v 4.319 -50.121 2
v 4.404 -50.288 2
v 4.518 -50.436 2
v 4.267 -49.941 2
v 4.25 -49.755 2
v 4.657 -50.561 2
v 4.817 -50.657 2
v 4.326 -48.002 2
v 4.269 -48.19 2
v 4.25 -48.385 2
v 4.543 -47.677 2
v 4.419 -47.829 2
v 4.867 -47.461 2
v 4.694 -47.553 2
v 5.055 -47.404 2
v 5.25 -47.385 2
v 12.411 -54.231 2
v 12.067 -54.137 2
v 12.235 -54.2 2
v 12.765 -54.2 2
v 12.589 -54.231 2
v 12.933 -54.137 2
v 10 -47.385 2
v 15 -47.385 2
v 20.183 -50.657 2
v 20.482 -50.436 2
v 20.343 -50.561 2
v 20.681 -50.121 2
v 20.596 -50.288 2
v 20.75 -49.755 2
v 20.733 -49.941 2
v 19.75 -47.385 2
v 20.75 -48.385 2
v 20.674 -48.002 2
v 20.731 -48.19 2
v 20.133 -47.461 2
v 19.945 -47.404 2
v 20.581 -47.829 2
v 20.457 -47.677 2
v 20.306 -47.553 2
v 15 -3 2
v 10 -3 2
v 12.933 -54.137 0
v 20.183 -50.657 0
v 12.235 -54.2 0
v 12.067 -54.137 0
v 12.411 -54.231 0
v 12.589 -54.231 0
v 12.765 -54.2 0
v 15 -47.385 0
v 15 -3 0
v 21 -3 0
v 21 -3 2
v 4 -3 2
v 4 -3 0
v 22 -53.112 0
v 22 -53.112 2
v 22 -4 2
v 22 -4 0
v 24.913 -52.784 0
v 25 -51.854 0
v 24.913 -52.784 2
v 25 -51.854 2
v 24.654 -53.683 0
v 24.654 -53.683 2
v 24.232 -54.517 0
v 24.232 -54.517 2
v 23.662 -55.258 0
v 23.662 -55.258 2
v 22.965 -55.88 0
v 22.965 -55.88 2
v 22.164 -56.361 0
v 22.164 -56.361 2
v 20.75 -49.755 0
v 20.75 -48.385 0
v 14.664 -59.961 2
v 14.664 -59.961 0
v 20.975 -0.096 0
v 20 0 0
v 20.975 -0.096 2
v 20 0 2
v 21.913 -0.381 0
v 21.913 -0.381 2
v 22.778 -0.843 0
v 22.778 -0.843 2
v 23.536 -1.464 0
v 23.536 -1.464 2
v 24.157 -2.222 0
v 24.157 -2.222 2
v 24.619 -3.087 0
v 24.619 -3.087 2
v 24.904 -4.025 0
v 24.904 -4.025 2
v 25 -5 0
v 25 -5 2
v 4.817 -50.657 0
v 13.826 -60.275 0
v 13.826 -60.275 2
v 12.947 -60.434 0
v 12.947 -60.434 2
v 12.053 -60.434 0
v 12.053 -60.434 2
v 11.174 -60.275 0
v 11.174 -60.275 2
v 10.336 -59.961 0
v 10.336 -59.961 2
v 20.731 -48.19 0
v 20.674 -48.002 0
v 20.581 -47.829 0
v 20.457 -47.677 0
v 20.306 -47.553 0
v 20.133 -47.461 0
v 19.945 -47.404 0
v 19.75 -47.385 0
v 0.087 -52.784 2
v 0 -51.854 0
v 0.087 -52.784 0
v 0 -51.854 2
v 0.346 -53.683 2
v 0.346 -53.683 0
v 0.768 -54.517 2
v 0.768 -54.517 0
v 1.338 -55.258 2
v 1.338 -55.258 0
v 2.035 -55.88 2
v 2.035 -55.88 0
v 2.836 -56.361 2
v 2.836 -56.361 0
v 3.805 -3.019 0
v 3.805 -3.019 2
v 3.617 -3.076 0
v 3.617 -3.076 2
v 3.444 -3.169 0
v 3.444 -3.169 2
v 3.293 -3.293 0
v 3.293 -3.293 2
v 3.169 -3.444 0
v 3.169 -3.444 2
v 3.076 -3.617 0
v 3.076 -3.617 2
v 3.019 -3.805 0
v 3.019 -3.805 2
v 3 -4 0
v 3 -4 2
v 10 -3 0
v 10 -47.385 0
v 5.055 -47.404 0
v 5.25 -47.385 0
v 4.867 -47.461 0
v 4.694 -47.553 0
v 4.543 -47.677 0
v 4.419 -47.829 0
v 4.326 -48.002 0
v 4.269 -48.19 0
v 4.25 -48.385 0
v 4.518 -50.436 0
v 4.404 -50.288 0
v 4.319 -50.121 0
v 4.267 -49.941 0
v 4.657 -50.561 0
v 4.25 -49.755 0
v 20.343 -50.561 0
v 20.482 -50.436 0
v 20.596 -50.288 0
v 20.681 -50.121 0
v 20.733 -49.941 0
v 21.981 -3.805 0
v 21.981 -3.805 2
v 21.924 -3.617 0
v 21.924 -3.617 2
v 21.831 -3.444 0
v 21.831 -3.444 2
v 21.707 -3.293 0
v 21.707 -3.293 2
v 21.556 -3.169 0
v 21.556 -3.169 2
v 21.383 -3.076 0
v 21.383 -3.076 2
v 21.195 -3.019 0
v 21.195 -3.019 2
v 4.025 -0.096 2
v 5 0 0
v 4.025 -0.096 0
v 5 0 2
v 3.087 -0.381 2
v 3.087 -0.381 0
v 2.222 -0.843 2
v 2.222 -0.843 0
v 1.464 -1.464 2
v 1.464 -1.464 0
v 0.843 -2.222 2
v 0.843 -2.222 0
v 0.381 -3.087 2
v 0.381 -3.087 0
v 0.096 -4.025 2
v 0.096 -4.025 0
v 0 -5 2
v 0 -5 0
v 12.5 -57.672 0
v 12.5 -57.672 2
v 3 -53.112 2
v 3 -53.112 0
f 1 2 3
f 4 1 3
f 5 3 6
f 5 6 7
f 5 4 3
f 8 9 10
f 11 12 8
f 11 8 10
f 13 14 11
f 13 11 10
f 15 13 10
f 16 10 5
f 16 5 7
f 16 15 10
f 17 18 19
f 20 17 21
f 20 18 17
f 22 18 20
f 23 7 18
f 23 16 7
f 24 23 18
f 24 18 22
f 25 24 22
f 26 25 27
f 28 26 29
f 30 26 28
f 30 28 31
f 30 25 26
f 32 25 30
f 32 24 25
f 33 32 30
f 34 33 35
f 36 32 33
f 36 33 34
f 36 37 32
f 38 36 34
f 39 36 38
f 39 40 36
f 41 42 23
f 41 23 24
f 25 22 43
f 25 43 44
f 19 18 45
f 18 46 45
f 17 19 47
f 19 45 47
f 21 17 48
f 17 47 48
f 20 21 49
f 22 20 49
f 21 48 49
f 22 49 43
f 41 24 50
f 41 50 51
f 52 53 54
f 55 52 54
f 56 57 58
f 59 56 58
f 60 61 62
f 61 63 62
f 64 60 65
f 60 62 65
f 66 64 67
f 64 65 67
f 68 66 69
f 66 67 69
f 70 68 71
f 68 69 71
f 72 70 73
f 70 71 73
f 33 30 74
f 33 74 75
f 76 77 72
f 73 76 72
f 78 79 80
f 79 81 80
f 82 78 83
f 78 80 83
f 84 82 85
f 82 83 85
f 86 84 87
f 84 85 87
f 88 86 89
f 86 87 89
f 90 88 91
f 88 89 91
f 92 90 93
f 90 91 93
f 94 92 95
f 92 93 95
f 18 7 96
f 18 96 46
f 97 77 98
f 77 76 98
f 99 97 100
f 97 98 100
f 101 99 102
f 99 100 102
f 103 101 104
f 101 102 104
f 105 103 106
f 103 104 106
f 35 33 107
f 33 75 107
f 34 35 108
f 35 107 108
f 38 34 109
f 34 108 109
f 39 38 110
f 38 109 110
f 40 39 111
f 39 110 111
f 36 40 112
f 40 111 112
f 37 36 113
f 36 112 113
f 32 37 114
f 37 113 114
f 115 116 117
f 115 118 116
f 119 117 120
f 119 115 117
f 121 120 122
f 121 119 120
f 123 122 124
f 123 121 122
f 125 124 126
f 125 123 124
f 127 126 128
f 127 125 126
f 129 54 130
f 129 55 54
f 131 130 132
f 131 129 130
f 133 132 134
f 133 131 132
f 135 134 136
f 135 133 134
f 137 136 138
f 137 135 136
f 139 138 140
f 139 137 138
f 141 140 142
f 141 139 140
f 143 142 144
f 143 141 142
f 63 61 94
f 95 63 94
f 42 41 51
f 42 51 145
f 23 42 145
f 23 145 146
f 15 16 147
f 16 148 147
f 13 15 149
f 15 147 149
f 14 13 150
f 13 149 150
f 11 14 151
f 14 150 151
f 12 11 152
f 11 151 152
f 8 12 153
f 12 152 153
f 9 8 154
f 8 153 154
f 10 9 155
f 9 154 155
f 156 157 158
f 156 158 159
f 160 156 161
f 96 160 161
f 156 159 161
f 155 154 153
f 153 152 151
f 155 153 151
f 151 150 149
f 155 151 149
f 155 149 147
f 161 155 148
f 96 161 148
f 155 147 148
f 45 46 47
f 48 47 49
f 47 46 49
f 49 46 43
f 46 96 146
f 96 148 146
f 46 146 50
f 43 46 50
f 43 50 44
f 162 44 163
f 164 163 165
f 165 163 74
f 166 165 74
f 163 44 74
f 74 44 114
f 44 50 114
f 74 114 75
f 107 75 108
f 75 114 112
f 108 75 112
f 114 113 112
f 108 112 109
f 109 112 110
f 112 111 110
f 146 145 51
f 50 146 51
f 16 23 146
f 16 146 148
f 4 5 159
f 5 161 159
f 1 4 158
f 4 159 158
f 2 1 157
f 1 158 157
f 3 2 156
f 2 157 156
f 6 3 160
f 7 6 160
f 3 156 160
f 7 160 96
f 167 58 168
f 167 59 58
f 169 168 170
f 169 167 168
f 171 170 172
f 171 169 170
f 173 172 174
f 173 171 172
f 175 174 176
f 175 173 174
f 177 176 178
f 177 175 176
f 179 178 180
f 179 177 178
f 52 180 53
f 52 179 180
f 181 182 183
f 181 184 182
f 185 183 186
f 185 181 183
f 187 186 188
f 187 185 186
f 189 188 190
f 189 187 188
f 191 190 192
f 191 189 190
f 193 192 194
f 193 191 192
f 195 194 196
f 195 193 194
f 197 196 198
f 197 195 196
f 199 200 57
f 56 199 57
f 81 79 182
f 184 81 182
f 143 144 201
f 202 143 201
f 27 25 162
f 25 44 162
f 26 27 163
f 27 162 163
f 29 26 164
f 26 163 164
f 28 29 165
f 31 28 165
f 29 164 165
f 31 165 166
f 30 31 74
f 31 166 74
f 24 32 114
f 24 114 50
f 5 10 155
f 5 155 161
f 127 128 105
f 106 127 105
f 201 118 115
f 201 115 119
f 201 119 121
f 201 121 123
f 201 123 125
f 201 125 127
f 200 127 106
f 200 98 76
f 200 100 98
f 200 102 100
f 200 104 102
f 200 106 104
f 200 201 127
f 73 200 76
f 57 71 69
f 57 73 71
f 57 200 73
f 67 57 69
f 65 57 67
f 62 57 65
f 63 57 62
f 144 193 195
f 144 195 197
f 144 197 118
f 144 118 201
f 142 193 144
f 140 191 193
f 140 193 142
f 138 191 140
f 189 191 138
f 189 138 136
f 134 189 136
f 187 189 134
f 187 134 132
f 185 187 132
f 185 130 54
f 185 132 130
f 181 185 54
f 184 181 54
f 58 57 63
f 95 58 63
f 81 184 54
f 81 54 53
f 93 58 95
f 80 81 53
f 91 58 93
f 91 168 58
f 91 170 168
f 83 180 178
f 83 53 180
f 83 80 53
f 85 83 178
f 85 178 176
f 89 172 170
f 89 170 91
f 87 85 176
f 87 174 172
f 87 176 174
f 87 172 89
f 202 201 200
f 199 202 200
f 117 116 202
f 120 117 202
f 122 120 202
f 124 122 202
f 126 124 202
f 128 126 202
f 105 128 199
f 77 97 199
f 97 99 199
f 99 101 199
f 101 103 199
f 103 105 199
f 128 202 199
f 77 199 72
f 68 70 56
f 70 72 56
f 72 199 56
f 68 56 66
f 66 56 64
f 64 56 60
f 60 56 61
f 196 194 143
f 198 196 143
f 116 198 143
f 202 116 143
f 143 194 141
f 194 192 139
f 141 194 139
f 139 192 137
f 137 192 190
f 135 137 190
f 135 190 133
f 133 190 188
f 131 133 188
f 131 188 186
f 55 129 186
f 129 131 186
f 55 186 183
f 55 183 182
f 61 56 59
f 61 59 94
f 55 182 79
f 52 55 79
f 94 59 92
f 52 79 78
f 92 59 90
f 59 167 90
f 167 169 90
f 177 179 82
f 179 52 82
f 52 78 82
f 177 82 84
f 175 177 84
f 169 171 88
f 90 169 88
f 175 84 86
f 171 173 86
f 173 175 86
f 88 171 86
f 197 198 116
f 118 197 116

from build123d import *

# Parameters (mm, degrees)
F1_DEPTH = 2
F3_DEPTH = 2.001
F5_DEPTH = 2
F6_R     = 5
F7_R     = 1
F7_2_R   = 1


with BuildPart() as f1:
    # F0 (on Top) → F1 (new body)
    with BuildSketch(Plane.XY):
        Polygon((25, 0), (0, 0), (0, -55), (12.5, -61), (25, -55), align=None)
    extrude(amount=F1_DEPTH)

    # F2 (on face) → F3 (cut, through all)
    with BuildSketch(Plane.XY.offset(2)):
        Polygon((22, -53.112298), (22, -3), (3, -3), (3, -53.112298), (12.5, -57.672298), align=None)
    extrude(amount=-F3_DEPTH, mode=Mode.SUBTRACT)

    # F6
    f6_edges = [f1.edges().sort_by_distance(p)[0] for p in [
        (0, 0, 1),
        (25, 0, 1),
        (25, -55, 1),
        (12.5, -61, 1),
        (0, -55, 1),
    ]]
    fillet(f6_edges, radius=F6_R)

    # F7
    f7_edges = [f1.edges().sort_by_distance(p)[0] for p in [
        (3, -3, 1),
        (22, -3, 1),
    ]]
    fillet(f7_edges, radius=F7_R)


with BuildPart() as f5:
    # F4 (on face) → F5 (new body, through all)
    with BuildSketch(Plane.XY.offset(2)):
        Polygon((15, -3), (10, -3), (10, -47.384596), (4.25, -47.384596), (4.25, -50.384596), (12.5, -54.344596), (20.75, -50.384596), (20.75, -47.384596), (15, -47.384596), align=None)
    extrude(amount=-F5_DEPTH)

    # F7#2
    f7_2_edges = [f5.edges().sort_by_distance(p)[0] for p in [
        (20.75, -47.384596, 1),
        (20.75, -50.384596, 1),
        (12.5, -54.344596, 1),
        (4.25, -50.384596, 1),
        (4.25, -47.384596, 1),
    ]]
    fillet(f7_2_edges, radius=F7_2_R)


solid = Compound([f1.part, f5.part])
